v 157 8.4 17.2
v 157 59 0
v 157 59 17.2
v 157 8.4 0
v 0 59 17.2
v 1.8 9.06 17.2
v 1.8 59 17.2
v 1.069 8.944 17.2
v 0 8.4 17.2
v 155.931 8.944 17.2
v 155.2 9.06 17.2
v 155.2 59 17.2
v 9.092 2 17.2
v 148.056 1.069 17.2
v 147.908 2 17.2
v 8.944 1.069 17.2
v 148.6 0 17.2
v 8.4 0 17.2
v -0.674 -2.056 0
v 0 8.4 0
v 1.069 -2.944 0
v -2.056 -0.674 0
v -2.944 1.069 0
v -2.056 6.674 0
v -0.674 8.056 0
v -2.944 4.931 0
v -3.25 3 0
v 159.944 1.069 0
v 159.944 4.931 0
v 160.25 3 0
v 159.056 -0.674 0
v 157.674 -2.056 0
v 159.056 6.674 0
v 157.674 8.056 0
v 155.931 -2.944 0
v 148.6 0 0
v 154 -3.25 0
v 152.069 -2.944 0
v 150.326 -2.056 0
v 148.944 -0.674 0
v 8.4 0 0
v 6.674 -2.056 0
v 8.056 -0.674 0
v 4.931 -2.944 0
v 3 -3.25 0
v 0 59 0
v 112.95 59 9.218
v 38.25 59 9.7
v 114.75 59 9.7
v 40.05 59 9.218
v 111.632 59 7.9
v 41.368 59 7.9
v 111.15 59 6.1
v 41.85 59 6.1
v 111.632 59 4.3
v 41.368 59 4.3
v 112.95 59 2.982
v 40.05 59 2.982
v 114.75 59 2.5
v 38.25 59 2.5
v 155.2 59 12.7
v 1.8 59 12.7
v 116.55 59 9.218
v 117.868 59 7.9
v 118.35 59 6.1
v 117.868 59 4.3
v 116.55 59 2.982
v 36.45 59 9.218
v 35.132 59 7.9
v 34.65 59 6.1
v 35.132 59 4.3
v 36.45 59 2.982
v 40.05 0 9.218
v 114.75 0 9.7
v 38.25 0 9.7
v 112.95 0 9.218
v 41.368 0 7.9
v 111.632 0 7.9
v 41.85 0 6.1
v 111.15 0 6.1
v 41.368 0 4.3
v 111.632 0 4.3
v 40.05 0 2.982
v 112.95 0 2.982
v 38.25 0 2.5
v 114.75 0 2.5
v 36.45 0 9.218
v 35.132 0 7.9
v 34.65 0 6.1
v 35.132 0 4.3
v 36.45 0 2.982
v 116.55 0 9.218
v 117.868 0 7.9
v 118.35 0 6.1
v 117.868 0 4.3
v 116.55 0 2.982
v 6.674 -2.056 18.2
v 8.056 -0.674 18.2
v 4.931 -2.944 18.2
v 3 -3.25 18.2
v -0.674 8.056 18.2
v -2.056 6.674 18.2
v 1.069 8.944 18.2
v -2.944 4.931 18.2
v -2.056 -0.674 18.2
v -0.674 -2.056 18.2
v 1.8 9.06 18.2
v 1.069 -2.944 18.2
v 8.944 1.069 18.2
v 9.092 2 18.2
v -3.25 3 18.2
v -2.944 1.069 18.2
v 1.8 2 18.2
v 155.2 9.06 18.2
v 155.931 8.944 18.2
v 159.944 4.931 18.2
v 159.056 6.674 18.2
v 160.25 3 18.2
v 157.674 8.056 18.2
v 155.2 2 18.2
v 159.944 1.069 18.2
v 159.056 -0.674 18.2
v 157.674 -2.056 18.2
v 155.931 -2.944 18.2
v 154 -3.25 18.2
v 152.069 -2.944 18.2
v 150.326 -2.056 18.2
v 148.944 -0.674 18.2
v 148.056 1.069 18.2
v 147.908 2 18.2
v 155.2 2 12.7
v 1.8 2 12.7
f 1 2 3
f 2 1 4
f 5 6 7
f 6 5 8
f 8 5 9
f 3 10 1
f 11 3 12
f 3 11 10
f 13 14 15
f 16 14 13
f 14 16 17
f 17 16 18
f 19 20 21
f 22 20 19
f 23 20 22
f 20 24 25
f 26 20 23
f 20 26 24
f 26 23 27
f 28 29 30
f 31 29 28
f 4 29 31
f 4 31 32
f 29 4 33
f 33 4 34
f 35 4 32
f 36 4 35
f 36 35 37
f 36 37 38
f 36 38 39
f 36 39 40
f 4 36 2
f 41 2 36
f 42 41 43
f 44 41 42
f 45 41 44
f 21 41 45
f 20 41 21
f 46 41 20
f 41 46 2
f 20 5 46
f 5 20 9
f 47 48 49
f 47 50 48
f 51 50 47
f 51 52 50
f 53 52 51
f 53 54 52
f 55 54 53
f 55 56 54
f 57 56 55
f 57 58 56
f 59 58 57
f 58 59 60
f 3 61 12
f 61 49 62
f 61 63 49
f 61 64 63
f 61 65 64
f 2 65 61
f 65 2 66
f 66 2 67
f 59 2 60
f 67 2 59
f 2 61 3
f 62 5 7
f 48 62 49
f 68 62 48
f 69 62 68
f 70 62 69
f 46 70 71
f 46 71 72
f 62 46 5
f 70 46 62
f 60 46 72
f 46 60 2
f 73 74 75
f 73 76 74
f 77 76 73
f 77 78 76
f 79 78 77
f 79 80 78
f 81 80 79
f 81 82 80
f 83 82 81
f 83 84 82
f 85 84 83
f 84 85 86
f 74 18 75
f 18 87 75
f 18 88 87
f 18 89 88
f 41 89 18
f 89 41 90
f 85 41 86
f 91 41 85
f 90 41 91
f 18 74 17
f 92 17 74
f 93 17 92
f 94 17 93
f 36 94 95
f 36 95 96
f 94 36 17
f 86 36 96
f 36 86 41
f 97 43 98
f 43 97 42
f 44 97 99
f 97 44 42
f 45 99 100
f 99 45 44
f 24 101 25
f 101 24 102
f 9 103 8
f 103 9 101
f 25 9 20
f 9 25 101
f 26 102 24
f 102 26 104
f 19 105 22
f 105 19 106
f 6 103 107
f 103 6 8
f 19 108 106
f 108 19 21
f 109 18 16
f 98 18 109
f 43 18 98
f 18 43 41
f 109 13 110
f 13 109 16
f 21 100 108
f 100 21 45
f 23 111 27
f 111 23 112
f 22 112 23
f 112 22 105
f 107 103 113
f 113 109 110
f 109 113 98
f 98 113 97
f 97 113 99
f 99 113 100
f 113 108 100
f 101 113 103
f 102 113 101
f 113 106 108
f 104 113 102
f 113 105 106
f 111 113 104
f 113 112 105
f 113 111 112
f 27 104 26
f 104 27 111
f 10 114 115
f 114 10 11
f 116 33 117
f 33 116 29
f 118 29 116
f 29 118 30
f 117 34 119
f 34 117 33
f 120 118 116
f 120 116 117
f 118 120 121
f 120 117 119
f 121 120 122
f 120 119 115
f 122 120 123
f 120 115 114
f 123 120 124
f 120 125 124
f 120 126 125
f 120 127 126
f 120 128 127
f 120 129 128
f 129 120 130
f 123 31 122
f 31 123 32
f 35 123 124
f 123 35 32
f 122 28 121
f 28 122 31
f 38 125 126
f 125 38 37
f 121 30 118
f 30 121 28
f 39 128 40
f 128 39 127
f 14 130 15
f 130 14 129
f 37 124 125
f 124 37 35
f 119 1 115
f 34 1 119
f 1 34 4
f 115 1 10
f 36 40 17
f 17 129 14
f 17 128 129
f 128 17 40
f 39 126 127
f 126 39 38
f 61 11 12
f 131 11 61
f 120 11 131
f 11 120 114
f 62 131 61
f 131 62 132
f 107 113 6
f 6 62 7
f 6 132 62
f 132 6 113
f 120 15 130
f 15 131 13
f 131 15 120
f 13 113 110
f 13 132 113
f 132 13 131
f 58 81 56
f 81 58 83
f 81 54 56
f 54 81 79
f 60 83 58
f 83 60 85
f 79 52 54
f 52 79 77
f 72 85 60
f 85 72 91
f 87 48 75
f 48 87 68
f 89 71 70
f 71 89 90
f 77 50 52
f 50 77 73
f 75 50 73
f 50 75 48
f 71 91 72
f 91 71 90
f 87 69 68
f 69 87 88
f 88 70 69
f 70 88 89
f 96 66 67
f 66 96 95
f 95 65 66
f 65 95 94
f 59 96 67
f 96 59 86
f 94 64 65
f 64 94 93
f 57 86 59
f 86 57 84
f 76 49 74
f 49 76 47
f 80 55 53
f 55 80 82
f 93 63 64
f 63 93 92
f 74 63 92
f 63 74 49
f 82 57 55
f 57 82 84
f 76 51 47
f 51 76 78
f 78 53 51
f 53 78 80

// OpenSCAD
/**
Glass build plate holder 2-piece
**/

/* [Main] */
// Width of build plate (mm)
plate_width = 153; //[100:400]
// Length of build plate (mm)
plate_length = 236; //[100:400]
// Thickness of build plate (mm)
plate_thickness = 5; //[2:8]
/* [Extras] */
// Diameter of holes for threaded rod
hole_diameter = 7.2; //[4:10]
/* [Hidden] */
support_height = plate_thickness+hole_diameter+5;
support_diameter = plate_thickness*2.5;

union() {
  difference() {
    union() {
      cube([plate_width+4,plate_length/4,support_height]);
      translate([3,3,0])
        cylinder(r=support_diameter/2,h=support_height+1);
      translate([(plate_width+4)-3,3,0])
        cylinder(r=support_diameter/2,h=support_height+1);
    }
    translate([1.8,2,(support_height+.5)-plate_thickness])
      cube([plate_width+.4,(plate_length/4)+1,plate_thickness+4]);
    translate([plate_width/4,-.1,(support_height-plate_thickness)/2])
      rotate([270,0,0])
        cylinder(r=hole_diameter/2,h=plate_length);
    translate([plate_width-(plate_width/4),-.1,(support_height-plate_thickness)/2])
      rotate([270,0,0])
        cylinder(r=hole_diameter/2,h=plate_length);
  }
  //translate([plate_width/3,plate_length/8,(support_height-plate_thickness)-1])
  //  cylinder(r=hole_diameter/2,h=3);
  //translate([plate_width-(plate_width/3),plate_length/8,(support_height-plate_thickness)-1])
  //  cylinder(r=hole_diameter/2,h=3);
}
